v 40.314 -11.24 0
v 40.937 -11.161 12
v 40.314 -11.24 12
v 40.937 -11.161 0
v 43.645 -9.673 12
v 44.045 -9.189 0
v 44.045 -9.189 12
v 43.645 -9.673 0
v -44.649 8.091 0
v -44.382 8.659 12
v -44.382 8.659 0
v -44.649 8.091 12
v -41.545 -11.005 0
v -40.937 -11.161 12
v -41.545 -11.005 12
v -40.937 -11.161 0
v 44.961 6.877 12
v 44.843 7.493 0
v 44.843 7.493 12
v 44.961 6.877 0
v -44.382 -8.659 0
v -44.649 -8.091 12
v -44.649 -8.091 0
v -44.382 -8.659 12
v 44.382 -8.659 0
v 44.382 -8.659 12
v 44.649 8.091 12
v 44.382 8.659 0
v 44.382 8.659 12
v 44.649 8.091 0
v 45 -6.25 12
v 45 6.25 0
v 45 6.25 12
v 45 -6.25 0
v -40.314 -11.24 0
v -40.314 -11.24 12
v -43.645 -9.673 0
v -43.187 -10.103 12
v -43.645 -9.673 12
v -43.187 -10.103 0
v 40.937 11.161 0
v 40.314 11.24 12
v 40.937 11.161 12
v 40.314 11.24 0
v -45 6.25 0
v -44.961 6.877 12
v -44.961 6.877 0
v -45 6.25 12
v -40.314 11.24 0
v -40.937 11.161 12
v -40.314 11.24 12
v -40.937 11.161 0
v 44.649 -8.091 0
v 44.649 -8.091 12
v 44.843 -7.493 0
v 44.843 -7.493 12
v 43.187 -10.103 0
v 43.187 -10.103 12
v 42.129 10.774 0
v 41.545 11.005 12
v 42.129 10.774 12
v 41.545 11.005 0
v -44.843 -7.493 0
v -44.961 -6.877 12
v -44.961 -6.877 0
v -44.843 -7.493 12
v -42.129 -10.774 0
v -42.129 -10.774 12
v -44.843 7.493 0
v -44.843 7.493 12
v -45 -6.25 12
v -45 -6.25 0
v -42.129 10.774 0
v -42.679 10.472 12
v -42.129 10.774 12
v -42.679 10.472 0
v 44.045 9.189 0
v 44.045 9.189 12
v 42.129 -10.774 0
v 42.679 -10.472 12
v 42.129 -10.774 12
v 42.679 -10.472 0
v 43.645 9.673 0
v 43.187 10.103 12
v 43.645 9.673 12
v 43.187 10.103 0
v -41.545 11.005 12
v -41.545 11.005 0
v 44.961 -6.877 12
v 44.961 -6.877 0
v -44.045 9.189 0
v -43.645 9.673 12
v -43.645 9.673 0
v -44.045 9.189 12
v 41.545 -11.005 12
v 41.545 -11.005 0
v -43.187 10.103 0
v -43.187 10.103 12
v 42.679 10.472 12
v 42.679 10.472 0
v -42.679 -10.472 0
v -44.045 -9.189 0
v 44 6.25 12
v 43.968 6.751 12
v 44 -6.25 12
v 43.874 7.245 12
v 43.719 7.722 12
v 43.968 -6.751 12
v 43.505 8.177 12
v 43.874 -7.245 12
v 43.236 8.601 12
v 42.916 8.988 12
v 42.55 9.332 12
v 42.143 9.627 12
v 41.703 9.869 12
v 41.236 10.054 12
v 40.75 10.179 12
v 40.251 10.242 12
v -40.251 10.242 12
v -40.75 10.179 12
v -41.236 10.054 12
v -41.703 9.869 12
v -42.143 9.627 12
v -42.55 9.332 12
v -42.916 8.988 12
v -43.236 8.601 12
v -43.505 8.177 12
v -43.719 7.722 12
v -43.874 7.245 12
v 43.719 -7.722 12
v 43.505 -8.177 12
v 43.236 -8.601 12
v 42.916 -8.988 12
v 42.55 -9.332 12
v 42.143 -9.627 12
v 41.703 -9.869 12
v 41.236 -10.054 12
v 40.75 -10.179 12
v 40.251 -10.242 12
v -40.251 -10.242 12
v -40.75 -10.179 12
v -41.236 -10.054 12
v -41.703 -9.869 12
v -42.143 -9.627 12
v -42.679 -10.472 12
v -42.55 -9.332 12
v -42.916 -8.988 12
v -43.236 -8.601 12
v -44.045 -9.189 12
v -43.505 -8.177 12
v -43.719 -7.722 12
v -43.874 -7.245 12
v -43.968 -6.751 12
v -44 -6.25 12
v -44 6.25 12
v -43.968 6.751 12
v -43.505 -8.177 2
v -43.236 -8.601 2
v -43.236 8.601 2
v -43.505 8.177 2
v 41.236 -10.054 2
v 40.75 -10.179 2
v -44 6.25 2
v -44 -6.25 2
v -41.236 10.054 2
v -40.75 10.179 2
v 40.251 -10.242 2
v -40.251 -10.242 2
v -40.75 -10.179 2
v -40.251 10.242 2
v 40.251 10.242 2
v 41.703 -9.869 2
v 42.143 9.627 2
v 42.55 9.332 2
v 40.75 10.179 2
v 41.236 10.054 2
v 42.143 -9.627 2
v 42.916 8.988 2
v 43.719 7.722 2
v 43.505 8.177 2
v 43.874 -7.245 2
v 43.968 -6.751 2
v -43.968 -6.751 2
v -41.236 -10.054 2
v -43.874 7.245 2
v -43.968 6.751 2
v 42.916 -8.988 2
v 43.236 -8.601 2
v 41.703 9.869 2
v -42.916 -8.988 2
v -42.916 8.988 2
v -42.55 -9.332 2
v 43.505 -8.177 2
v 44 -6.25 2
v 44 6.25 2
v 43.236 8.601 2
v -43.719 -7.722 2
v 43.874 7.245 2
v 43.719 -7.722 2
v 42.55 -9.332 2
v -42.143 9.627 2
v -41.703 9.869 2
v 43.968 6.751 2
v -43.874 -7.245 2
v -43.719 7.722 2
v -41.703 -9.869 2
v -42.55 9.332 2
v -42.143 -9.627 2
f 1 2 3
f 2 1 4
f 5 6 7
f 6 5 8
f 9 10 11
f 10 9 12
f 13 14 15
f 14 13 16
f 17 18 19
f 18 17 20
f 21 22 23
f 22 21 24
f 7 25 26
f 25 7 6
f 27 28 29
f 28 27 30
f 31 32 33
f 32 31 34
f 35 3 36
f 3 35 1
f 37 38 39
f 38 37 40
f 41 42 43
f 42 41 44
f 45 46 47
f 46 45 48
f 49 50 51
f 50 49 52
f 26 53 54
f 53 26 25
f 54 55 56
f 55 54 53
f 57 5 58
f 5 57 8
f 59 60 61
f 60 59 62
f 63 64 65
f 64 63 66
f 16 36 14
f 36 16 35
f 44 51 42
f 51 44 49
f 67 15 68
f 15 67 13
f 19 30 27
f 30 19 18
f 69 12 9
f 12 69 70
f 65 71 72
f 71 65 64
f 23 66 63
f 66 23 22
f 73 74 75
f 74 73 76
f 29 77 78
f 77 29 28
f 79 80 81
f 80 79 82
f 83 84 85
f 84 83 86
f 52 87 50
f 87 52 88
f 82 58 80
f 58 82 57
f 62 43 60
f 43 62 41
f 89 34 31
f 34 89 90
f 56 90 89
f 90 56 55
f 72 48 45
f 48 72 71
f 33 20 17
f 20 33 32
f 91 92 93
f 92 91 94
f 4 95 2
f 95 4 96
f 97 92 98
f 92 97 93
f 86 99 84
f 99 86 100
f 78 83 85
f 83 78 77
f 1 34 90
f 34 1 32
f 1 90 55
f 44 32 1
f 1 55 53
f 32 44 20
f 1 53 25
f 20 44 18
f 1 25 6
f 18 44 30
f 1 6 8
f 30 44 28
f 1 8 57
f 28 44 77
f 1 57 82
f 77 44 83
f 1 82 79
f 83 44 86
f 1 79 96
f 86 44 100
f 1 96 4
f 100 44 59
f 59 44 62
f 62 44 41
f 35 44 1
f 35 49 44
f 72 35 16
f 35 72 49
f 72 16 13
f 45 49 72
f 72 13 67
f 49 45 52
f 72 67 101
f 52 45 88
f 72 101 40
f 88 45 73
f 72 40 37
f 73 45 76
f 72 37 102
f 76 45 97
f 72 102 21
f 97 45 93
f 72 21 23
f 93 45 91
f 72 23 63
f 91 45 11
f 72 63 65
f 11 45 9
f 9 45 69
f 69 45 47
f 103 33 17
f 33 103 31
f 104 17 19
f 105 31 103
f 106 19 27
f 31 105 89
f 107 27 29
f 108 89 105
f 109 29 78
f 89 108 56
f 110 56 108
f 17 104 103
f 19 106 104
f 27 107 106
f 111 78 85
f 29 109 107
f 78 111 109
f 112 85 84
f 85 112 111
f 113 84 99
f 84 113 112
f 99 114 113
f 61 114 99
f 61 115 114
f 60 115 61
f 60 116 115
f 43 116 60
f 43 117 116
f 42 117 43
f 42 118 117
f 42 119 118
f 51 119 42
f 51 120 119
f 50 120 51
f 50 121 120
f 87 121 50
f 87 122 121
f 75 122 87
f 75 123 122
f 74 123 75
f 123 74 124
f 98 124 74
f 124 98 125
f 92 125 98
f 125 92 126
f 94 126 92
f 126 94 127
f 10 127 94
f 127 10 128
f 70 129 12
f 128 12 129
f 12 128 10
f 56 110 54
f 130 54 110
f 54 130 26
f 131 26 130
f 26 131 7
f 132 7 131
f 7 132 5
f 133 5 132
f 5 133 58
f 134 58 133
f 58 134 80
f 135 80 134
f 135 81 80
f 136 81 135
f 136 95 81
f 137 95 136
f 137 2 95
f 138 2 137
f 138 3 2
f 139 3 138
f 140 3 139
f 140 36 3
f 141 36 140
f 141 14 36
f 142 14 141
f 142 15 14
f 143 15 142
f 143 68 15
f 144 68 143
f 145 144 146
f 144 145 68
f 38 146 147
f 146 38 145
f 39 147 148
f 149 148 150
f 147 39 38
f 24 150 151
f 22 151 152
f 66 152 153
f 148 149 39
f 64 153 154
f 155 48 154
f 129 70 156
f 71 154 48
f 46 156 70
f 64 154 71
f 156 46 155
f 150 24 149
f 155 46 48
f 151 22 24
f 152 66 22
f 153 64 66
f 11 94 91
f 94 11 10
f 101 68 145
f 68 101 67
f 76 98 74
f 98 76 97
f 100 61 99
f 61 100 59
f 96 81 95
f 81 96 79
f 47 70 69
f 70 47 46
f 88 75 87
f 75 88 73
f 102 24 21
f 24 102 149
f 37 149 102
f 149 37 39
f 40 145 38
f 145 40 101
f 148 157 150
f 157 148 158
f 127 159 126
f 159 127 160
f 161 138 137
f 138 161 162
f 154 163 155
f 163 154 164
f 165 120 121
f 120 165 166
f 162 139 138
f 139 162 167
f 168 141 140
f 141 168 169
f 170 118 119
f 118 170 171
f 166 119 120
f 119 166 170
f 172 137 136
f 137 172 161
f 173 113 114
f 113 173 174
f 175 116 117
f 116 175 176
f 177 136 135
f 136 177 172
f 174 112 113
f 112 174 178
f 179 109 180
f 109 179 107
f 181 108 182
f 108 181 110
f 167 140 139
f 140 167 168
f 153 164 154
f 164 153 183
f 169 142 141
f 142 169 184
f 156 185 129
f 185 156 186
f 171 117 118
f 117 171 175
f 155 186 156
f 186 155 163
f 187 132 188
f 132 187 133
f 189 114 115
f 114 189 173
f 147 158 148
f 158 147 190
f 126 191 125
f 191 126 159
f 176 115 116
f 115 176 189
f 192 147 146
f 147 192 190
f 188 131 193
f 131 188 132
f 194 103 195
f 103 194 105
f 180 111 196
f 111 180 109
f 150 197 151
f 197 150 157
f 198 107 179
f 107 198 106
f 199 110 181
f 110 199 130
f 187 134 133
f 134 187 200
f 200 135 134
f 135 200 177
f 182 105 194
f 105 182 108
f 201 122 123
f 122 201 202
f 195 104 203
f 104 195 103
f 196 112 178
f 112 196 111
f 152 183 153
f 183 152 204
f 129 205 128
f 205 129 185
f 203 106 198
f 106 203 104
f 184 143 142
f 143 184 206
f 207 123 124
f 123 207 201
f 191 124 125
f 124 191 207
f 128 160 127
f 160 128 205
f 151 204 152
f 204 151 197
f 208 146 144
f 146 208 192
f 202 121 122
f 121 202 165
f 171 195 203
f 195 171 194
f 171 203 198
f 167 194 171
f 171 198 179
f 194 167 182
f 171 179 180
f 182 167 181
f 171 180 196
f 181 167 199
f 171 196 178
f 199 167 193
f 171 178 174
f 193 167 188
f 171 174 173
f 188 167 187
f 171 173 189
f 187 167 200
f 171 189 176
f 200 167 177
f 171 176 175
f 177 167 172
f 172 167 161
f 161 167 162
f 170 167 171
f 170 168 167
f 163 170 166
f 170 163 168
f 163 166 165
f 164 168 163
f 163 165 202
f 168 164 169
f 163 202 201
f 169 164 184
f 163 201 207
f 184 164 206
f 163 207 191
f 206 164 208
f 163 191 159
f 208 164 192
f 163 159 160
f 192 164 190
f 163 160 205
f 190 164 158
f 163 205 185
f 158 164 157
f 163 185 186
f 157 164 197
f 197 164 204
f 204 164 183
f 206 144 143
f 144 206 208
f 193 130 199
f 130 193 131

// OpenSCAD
$fn = 50;


difference() {
	union() {
		hull() {
			translate(v = [-40.0000000000, 6.2500000000, 0]) {
				cylinder(h = 12, r = 5);
			}
			translate(v = [40.0000000000, 6.2500000000, 0]) {
				cylinder(h = 12, r = 5);
			}
			translate(v = [-40.0000000000, -6.2500000000, 0]) {
				cylinder(h = 12, r = 5);
			}
			translate(v = [40.0000000000, -6.2500000000, 0]) {
				cylinder(h = 12, r = 5);
			}
		}
	}
	union() {
		translate(v = [0, 0, 2]) {
			#hull() {
				translate(v = [-40.0000000000, 6.2500000000, 0]) {
					cylinder(h = 10, r = 4);
				}
				translate(v = [40.0000000000, 6.2500000000, 0]) {
					cylinder(h = 10, r = 4);
				}
				translate(v = [-40.0000000000, -6.2500000000, 0]) {
					cylinder(h = 10, r = 4);
				}
				translate(v = [40.0000000000, -6.2500000000, 0]) {
					cylinder(h = 10, r = 4);
				}
			}
		}
	}
}
